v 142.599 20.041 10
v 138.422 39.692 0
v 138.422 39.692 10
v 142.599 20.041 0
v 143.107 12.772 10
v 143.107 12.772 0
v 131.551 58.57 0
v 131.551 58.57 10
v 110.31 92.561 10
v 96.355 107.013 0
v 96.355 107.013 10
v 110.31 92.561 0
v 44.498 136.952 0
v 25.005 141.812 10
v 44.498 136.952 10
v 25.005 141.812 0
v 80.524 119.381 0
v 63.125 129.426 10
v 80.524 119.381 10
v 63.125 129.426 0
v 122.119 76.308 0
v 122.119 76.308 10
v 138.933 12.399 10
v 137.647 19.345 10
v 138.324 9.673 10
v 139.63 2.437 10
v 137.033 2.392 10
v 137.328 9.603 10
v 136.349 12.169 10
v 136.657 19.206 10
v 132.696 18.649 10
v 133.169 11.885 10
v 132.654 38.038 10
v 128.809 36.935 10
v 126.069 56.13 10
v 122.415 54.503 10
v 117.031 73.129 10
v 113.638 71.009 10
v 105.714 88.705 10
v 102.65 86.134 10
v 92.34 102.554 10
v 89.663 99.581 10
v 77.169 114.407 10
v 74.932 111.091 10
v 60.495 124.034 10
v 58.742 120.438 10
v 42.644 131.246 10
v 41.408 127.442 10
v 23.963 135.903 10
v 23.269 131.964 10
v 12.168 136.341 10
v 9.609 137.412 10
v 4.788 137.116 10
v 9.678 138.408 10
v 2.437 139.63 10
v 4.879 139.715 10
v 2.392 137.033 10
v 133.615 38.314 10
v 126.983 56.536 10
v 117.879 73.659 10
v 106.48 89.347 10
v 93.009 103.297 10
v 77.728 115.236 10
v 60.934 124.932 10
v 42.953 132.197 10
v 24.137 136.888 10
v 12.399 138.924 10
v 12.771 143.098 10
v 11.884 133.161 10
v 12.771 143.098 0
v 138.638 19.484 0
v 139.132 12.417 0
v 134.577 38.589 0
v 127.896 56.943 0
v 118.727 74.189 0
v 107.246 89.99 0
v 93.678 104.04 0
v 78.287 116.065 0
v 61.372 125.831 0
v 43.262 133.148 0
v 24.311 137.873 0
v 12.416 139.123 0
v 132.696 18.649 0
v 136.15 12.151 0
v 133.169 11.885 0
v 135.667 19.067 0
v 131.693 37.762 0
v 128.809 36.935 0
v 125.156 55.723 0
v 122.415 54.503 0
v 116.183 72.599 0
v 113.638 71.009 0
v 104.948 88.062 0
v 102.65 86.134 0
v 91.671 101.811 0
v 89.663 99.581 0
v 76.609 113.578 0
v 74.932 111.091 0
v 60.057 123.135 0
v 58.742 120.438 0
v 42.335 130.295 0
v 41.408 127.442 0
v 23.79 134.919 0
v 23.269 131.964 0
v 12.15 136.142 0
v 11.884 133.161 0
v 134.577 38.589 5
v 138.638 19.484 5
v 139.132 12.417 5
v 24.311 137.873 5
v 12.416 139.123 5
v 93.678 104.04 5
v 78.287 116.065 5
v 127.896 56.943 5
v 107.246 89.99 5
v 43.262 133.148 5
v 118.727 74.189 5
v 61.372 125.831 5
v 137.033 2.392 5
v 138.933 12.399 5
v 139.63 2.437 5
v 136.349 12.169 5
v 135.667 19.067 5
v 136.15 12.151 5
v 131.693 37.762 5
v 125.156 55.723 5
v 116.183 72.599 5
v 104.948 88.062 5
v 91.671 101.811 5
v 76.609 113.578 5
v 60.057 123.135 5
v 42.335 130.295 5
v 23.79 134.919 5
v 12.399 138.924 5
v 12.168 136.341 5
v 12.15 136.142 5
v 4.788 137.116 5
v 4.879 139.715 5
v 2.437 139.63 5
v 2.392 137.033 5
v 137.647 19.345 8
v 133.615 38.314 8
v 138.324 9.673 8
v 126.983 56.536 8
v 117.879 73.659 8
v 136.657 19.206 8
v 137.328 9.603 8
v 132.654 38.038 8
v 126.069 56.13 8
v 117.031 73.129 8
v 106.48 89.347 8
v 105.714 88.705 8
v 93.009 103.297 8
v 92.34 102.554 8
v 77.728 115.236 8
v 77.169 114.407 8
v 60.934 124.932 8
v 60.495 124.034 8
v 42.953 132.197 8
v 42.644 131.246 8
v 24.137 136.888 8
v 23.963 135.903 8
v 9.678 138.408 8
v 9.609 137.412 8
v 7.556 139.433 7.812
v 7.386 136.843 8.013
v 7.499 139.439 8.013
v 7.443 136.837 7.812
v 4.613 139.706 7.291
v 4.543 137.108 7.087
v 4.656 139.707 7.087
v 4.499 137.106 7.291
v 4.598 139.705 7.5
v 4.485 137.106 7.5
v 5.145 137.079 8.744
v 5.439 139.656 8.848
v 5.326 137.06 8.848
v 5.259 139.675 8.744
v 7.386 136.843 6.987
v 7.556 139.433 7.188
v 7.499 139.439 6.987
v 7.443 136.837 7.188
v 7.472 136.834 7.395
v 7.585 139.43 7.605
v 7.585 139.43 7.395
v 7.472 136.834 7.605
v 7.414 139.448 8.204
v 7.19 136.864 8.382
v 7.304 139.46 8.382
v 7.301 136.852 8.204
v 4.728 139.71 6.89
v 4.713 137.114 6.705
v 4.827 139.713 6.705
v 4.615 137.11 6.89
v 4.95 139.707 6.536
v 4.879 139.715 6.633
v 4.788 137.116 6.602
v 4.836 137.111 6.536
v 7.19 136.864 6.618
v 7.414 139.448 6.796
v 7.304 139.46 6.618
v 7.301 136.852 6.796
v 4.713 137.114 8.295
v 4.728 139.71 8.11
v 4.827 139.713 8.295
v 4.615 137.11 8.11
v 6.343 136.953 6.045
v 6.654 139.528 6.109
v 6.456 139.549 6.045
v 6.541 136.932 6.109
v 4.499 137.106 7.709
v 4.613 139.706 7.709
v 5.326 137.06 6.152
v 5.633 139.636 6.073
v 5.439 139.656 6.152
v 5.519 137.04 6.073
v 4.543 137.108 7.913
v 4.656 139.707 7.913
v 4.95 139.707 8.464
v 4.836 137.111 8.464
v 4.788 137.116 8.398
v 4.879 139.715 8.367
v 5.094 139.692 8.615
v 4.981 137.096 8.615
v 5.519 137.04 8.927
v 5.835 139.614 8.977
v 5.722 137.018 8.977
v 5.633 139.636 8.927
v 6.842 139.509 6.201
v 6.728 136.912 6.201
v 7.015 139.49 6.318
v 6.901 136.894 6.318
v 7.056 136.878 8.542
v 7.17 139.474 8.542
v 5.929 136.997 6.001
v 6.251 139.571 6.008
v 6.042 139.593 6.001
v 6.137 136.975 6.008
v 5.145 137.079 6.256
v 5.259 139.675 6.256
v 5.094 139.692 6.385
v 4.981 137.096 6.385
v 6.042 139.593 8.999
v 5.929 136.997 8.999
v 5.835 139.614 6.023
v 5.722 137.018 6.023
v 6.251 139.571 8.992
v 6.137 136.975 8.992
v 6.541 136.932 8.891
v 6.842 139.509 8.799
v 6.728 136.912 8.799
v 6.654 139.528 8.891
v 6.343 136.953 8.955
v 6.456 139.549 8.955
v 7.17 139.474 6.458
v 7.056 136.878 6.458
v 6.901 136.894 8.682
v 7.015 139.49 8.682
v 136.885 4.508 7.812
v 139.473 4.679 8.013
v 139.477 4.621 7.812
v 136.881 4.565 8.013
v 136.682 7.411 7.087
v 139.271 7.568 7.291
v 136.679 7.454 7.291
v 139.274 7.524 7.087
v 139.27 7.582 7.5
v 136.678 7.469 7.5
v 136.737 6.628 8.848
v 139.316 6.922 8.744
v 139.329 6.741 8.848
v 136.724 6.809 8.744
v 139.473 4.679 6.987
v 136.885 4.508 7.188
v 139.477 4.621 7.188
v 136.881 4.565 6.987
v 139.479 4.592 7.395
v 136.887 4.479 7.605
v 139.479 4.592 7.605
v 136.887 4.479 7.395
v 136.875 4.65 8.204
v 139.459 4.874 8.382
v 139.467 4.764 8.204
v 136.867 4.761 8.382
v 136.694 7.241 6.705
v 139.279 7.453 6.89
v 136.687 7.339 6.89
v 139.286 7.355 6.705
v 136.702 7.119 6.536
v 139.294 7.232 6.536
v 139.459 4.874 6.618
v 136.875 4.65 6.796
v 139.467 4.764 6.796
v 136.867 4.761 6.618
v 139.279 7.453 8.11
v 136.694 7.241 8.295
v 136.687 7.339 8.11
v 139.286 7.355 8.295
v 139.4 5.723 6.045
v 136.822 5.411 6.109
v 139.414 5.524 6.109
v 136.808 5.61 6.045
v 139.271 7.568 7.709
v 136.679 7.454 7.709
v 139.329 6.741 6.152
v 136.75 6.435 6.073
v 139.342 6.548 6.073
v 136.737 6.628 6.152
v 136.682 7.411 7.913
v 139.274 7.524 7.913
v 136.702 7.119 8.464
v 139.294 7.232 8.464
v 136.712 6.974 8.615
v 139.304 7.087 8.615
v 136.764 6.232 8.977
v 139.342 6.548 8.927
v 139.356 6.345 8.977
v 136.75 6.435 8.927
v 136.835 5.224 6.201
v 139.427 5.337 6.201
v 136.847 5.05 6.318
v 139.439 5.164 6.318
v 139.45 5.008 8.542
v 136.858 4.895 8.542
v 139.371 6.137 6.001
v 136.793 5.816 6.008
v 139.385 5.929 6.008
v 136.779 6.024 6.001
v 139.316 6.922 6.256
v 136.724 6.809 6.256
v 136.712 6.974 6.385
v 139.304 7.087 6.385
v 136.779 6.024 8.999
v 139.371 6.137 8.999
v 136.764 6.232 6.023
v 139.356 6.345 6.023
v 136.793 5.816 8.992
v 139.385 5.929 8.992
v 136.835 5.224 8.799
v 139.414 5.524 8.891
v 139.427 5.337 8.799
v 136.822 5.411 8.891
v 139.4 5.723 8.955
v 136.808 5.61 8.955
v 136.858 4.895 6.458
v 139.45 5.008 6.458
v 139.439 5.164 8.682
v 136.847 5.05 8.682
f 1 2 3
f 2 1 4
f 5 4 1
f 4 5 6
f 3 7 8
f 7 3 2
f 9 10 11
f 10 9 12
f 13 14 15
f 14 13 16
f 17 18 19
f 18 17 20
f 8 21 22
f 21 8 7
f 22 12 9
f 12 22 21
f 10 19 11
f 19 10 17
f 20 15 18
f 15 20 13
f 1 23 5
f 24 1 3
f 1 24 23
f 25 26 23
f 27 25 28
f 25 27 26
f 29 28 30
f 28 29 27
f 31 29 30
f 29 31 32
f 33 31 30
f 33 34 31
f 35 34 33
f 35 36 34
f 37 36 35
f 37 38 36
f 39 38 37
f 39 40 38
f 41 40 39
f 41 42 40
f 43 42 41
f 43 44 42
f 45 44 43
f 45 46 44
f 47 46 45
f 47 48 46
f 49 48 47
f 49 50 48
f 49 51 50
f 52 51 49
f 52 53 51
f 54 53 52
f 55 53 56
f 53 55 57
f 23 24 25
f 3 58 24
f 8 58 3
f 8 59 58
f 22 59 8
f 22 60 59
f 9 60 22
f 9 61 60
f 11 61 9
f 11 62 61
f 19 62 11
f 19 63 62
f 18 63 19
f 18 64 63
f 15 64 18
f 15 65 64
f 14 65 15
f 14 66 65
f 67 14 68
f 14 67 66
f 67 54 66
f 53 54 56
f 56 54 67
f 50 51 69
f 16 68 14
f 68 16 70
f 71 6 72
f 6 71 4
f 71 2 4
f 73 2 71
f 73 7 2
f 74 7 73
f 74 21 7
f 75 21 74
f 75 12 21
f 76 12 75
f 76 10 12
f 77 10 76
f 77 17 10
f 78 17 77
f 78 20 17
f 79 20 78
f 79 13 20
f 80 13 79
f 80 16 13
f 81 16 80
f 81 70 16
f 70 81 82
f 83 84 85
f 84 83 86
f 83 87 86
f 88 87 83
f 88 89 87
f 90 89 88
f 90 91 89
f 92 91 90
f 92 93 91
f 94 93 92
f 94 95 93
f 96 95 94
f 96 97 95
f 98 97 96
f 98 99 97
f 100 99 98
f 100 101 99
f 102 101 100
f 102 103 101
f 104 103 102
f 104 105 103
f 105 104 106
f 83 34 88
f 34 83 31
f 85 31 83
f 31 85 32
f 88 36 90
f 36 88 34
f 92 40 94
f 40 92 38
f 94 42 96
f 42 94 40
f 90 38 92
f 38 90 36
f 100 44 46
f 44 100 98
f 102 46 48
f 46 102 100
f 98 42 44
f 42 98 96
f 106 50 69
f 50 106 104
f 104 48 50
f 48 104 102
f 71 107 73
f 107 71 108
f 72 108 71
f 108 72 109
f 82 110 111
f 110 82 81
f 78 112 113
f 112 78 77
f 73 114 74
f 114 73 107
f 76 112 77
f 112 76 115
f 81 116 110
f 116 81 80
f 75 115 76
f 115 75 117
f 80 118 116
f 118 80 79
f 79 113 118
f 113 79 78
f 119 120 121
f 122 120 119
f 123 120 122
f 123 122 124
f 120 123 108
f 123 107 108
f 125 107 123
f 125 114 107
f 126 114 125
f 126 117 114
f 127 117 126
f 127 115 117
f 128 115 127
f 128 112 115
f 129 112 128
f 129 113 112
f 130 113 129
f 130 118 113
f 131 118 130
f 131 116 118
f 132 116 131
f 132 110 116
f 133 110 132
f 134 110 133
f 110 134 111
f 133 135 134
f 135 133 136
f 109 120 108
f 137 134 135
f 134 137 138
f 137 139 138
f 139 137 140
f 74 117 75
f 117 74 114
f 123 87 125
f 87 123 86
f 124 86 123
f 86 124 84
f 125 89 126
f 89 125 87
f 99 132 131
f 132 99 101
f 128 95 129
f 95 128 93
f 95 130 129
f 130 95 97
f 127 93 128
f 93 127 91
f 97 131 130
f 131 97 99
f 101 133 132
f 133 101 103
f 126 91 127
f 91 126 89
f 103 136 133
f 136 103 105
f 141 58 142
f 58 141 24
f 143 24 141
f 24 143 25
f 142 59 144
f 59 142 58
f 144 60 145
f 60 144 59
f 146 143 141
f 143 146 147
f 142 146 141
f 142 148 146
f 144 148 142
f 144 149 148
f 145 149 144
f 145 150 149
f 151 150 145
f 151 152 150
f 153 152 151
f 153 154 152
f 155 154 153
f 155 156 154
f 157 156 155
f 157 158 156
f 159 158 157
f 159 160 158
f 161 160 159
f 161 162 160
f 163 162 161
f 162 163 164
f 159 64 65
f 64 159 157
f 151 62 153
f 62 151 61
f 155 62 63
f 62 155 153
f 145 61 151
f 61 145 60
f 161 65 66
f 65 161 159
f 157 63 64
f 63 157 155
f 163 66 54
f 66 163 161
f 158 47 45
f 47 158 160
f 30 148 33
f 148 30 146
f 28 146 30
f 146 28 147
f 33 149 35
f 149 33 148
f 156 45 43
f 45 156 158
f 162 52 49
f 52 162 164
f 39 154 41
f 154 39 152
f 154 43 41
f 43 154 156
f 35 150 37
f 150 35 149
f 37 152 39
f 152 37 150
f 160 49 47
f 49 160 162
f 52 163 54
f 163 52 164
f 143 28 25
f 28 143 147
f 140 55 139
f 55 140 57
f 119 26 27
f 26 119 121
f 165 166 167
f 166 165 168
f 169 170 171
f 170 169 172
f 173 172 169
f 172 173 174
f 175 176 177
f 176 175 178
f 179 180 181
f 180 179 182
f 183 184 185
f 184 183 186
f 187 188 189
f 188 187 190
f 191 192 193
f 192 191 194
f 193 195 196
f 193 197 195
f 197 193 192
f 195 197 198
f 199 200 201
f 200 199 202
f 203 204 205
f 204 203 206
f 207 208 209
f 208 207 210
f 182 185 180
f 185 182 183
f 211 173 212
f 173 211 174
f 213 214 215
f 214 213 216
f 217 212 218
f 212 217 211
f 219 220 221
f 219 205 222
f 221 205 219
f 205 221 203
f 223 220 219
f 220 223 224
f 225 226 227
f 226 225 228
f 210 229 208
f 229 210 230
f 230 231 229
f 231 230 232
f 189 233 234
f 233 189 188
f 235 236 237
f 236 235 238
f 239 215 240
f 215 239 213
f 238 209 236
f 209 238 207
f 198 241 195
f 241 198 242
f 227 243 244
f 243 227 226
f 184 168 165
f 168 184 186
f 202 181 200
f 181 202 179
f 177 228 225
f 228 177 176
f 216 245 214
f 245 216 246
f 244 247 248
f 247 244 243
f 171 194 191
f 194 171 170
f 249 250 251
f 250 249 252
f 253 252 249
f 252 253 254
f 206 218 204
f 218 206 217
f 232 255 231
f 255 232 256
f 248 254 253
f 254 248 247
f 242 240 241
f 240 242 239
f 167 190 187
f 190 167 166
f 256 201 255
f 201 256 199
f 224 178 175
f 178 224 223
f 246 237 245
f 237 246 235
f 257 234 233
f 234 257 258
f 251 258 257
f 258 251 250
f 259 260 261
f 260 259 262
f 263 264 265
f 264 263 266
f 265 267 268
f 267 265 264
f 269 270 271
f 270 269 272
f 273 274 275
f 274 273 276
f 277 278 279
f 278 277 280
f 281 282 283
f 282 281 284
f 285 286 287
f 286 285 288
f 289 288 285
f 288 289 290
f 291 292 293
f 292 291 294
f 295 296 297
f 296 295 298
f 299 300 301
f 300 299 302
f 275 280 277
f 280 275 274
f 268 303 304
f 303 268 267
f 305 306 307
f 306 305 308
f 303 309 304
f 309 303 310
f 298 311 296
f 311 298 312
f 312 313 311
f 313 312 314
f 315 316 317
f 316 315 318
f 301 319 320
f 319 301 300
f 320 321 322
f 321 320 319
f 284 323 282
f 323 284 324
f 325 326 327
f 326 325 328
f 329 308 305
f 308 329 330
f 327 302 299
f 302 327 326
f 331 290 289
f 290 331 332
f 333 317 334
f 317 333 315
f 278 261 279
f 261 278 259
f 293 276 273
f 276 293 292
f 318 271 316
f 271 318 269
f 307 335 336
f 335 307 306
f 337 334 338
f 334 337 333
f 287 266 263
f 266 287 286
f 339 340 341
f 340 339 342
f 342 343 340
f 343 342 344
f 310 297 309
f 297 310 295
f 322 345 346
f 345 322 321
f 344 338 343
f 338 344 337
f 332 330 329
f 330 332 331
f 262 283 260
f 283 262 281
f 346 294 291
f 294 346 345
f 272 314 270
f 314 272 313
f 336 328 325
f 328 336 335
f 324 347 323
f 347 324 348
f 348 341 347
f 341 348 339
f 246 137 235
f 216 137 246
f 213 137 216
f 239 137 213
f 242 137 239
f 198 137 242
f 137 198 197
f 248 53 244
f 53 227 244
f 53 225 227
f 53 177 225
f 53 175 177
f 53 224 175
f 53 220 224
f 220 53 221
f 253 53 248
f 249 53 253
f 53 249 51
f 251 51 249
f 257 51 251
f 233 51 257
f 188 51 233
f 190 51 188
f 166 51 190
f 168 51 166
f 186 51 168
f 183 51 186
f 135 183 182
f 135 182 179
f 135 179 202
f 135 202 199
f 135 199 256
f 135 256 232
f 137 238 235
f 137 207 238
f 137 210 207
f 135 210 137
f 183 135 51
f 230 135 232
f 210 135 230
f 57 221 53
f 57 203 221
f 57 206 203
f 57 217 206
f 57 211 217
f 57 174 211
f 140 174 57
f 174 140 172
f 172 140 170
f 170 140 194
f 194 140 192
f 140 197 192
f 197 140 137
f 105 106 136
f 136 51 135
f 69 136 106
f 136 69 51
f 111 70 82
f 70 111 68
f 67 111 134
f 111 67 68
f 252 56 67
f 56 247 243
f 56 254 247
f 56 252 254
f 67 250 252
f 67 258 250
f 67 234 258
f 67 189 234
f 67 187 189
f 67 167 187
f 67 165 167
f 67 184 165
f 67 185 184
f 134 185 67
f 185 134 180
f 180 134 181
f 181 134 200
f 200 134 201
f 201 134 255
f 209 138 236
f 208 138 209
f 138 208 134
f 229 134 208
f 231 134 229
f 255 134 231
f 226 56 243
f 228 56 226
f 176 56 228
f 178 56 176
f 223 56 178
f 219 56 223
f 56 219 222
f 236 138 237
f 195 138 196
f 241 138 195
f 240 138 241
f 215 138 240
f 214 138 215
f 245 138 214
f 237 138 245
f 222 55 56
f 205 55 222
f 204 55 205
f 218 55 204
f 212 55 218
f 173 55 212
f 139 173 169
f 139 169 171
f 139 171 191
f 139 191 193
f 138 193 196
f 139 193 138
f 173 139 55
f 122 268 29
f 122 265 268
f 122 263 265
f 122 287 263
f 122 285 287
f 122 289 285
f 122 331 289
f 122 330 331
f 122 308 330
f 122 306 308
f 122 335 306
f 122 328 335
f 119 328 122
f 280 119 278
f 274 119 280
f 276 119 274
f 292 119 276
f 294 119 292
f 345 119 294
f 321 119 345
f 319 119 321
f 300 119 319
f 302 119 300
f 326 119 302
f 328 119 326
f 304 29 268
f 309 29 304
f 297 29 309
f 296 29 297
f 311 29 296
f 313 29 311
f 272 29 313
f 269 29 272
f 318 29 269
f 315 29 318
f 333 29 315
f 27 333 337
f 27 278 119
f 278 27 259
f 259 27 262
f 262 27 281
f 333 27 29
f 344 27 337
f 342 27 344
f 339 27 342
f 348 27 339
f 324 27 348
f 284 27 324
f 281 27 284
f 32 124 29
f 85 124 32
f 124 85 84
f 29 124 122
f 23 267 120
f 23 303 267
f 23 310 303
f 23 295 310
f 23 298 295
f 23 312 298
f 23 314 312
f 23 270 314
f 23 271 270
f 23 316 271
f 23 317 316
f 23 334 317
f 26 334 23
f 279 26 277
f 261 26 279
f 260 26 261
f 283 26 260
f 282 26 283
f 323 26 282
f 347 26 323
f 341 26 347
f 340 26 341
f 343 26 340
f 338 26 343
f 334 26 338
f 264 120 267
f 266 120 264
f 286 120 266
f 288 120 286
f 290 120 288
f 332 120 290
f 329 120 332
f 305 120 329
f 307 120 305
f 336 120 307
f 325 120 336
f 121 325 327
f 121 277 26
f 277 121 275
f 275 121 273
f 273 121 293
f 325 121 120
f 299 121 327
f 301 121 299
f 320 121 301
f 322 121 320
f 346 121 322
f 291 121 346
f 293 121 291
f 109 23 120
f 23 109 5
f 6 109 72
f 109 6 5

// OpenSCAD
$fn = 45;
fn_o = $fn;
eps = 0.01;
tol = 0.2;

// M3
m3_l=10;
m3_d=3;
m3_nd=6.0;
m3_nh=2.3;
m3_hd=5.5;
m3_hh=2;

// main shape parameters
wt = 3;
r_o = 140;
r_i = r_o-wt;
h=70+45-42;
wt_i = 3;
wt_o = 4;

// additional parameters
// border height
bh = 5;
// border thickness
bt = 3;

// support
// col angle width
ca = 5;
// foil thickness
ft = 1;
// foil height
fh = 2;


module bolt_hole()
{
    // head
    cylinder(h=m3_hh,d=m3_hd);
    
    // thread
    cylinder(h=m3_hh+m3_l,d=m3_d);
    
    // nut
    translate([0,0,m3_hh+m3_l-3])
        cylinder(d=m3_nd+tol,h=m3_l,$fn=6);
}

// cut in the shape of pie slice
module angle_cut(a_min, a_max,  h=20, d=1000)
{
    _h = h+2*eps;
    _a = d;
    
    rotate([0,0,180-a_min])
        translate([0,-d/2,-eps])
            cube([_a,_a,_h]);
    
    rotate([0,0,-a_max])
        translate([0,-d/2,-eps])
            cube([_a,_a,_h]);
}

// cylindrical ring-like shape
module cylinder_shell(r_i, r_o, h, fn_i=$fn, fn_o=$fn)
{
    difference()
    {
        cylinder(r=r_o,h=h,$fn=fn_o);
        translate([0,0,-eps])
            cylinder(r=r_i,h=h+2*eps, $fn=fn_i);
    }
}

module nut_holes()
{
    rotate([0,0,180+ca/2])
    {
        translate([0,-r_o-wt_o,1.5*bh])
            rotate([-90,0,0])
                bolt_hole();
        translate([0,-r_o-wt_o,h+bh/2])
            rotate([-90,0,0])
                bolt_hole();
    }
    
    rotate([0,0,180-ca/2])
    {
        translate([0,-r_o-wt_o,1.5*bh])
            rotate([-90,0,0])
                bolt_hole();
        translate([0,-r_o-wt_o,h+bh/2])
            rotate([-90,0,0])
                bolt_hole();
    }
}

module col(_ri, _ro, fn_i=$fn, fn_o=$fn)
{
    difference()
    {
        // main shape
        rotate([0,0,ca])
            cylinder_shell(r_i=_ro-wt_o, r_o=_ro, h=h+2*bh, fn_i=fn_i, fn_o=fn_o);
        
        // cut
        angle_cut(-ca, ca, h=h+2*bh, d=1000);
        
        // holes for the nuts and bolts
        nut_holes();
        
    }
}


module col_o()
{
    _ri = r_o;
    _ro = r_o+wt_o;
    _fn = 360/(2*ca);

    col(_ri, _ro, fn_o=_fn);

}

//col_o();

module col_i()
{
    
    _ri = r_i-wt_i;
    _ro = r_i-tol;
    _fn = 360/(2*ca);
    
    col(_ri, _ro, _fn);
    
    // middle part
    translate([0,0,2*bh+tol])
        difference()
        {
            
        rotate([0,0,ca])
            cylinder_shell(r_i=_ro-wt_o, r_o=r_o-2*tol, h=h-2*bh-2*tol);
        
        // cutting only certain area
        angle_cut(-ca, ca, h=h, d=1000);
        
        // cutting hole for the plastic foil
        translate([0,0,-eps])
            difference()
            {
                cylinder_shell( r_i=r_i+wt/2-ft/2,
                                r_o=r_o-wt/2+ft/2,
                                h=h+2*bh+2*eps);
                _a = 1000;
                rotate([0,0,180-ca+1])
                    translate([0,-_a/2,-eps])
                        cube([_a,_a,h+2*bh+2*eps]);                
            }
            
            translate([0,0,-eps])
            difference()
            {
                cylinder_shell( r_i=r_i+wt/2-ft/2,
                                r_o=r_o-wt/2+ft/2,
                                h=h+2*bh+2*eps);
                _a = 1000;
                rotate([0,0,ca-1])
                    translate([0,-_a/2,-eps])
                        cube([_a,_a,h+2*bh+2*eps]);                
            }
        }
    
}

//col_i();


module arch()
{
    difference()
    {
        // main shape
        cylinder_shell(r_i=r_i-wt_i, r_o=r_o+wt_o, h=2*bh);
        
        // lower shell cut
        translate([0,0,-eps])
            cylinder_shell(r_i=r_i, r_o=r_o, h=bh+eps);
        
        // upper shell cut
        translate([0,0,2*bh-fh])
        {
            difference()
            {
                cylinder_shell(r_i=r_i+wt/2-ft/2, r_o=r_o-wt/2+ft/2, h=fh+eps);
                angle_cut(ca-1, 91-ca,  h=2*bh+2*eps, d=1000);               
            }
            
        }
        
        // cutting only one quadrant
        angle_cut(1, 89,  h=20, d=1000);
        
        // screw holes
        nut_holes();
        rotate([0,0,-90]) nut_holes();
        
        // inner cut
        translate([0,0,-eps])
        difference()
        {
            cylinder_shell(r_i=r_i-wt_i-eps, r_o=r_i+tol, h=2*bh+2*eps);
            angle_cut(-ca, ca+0.1,  h=2*bh+2*eps, d=1000);
        }
        
        // outer cut
        translate([0,0,-eps])
        difference()
        {
            cylinder_shell(r_i=r_o-tol, r_o=r_o+wt_o+eps, h=2*bh+2*eps);
            angle_cut(-ca, ca+0.1,  h=2*bh+2*eps, d=1000);
        }
        
        // inner cut
        translate([0,0,-eps])
        difference()
        {
            cylinder_shell(r_i=r_i-wt_i-eps, r_o=r_i+tol, h=2*bh+2*eps);
            angle_cut(90-ca-0.1, 90+ca,  h=2*bh+2*eps, d=1000);
        }
        
        translate([0,0,-eps])
        difference()
        {
            cylinder_shell(r_i=r_o-tol, r_o=r_o+wt_o+eps, h=2*bh+2*eps);
            angle_cut(90-ca-0.1, 90+ca,  h=2*bh+2*eps, d=1000);
        }
    }
}

arch();
